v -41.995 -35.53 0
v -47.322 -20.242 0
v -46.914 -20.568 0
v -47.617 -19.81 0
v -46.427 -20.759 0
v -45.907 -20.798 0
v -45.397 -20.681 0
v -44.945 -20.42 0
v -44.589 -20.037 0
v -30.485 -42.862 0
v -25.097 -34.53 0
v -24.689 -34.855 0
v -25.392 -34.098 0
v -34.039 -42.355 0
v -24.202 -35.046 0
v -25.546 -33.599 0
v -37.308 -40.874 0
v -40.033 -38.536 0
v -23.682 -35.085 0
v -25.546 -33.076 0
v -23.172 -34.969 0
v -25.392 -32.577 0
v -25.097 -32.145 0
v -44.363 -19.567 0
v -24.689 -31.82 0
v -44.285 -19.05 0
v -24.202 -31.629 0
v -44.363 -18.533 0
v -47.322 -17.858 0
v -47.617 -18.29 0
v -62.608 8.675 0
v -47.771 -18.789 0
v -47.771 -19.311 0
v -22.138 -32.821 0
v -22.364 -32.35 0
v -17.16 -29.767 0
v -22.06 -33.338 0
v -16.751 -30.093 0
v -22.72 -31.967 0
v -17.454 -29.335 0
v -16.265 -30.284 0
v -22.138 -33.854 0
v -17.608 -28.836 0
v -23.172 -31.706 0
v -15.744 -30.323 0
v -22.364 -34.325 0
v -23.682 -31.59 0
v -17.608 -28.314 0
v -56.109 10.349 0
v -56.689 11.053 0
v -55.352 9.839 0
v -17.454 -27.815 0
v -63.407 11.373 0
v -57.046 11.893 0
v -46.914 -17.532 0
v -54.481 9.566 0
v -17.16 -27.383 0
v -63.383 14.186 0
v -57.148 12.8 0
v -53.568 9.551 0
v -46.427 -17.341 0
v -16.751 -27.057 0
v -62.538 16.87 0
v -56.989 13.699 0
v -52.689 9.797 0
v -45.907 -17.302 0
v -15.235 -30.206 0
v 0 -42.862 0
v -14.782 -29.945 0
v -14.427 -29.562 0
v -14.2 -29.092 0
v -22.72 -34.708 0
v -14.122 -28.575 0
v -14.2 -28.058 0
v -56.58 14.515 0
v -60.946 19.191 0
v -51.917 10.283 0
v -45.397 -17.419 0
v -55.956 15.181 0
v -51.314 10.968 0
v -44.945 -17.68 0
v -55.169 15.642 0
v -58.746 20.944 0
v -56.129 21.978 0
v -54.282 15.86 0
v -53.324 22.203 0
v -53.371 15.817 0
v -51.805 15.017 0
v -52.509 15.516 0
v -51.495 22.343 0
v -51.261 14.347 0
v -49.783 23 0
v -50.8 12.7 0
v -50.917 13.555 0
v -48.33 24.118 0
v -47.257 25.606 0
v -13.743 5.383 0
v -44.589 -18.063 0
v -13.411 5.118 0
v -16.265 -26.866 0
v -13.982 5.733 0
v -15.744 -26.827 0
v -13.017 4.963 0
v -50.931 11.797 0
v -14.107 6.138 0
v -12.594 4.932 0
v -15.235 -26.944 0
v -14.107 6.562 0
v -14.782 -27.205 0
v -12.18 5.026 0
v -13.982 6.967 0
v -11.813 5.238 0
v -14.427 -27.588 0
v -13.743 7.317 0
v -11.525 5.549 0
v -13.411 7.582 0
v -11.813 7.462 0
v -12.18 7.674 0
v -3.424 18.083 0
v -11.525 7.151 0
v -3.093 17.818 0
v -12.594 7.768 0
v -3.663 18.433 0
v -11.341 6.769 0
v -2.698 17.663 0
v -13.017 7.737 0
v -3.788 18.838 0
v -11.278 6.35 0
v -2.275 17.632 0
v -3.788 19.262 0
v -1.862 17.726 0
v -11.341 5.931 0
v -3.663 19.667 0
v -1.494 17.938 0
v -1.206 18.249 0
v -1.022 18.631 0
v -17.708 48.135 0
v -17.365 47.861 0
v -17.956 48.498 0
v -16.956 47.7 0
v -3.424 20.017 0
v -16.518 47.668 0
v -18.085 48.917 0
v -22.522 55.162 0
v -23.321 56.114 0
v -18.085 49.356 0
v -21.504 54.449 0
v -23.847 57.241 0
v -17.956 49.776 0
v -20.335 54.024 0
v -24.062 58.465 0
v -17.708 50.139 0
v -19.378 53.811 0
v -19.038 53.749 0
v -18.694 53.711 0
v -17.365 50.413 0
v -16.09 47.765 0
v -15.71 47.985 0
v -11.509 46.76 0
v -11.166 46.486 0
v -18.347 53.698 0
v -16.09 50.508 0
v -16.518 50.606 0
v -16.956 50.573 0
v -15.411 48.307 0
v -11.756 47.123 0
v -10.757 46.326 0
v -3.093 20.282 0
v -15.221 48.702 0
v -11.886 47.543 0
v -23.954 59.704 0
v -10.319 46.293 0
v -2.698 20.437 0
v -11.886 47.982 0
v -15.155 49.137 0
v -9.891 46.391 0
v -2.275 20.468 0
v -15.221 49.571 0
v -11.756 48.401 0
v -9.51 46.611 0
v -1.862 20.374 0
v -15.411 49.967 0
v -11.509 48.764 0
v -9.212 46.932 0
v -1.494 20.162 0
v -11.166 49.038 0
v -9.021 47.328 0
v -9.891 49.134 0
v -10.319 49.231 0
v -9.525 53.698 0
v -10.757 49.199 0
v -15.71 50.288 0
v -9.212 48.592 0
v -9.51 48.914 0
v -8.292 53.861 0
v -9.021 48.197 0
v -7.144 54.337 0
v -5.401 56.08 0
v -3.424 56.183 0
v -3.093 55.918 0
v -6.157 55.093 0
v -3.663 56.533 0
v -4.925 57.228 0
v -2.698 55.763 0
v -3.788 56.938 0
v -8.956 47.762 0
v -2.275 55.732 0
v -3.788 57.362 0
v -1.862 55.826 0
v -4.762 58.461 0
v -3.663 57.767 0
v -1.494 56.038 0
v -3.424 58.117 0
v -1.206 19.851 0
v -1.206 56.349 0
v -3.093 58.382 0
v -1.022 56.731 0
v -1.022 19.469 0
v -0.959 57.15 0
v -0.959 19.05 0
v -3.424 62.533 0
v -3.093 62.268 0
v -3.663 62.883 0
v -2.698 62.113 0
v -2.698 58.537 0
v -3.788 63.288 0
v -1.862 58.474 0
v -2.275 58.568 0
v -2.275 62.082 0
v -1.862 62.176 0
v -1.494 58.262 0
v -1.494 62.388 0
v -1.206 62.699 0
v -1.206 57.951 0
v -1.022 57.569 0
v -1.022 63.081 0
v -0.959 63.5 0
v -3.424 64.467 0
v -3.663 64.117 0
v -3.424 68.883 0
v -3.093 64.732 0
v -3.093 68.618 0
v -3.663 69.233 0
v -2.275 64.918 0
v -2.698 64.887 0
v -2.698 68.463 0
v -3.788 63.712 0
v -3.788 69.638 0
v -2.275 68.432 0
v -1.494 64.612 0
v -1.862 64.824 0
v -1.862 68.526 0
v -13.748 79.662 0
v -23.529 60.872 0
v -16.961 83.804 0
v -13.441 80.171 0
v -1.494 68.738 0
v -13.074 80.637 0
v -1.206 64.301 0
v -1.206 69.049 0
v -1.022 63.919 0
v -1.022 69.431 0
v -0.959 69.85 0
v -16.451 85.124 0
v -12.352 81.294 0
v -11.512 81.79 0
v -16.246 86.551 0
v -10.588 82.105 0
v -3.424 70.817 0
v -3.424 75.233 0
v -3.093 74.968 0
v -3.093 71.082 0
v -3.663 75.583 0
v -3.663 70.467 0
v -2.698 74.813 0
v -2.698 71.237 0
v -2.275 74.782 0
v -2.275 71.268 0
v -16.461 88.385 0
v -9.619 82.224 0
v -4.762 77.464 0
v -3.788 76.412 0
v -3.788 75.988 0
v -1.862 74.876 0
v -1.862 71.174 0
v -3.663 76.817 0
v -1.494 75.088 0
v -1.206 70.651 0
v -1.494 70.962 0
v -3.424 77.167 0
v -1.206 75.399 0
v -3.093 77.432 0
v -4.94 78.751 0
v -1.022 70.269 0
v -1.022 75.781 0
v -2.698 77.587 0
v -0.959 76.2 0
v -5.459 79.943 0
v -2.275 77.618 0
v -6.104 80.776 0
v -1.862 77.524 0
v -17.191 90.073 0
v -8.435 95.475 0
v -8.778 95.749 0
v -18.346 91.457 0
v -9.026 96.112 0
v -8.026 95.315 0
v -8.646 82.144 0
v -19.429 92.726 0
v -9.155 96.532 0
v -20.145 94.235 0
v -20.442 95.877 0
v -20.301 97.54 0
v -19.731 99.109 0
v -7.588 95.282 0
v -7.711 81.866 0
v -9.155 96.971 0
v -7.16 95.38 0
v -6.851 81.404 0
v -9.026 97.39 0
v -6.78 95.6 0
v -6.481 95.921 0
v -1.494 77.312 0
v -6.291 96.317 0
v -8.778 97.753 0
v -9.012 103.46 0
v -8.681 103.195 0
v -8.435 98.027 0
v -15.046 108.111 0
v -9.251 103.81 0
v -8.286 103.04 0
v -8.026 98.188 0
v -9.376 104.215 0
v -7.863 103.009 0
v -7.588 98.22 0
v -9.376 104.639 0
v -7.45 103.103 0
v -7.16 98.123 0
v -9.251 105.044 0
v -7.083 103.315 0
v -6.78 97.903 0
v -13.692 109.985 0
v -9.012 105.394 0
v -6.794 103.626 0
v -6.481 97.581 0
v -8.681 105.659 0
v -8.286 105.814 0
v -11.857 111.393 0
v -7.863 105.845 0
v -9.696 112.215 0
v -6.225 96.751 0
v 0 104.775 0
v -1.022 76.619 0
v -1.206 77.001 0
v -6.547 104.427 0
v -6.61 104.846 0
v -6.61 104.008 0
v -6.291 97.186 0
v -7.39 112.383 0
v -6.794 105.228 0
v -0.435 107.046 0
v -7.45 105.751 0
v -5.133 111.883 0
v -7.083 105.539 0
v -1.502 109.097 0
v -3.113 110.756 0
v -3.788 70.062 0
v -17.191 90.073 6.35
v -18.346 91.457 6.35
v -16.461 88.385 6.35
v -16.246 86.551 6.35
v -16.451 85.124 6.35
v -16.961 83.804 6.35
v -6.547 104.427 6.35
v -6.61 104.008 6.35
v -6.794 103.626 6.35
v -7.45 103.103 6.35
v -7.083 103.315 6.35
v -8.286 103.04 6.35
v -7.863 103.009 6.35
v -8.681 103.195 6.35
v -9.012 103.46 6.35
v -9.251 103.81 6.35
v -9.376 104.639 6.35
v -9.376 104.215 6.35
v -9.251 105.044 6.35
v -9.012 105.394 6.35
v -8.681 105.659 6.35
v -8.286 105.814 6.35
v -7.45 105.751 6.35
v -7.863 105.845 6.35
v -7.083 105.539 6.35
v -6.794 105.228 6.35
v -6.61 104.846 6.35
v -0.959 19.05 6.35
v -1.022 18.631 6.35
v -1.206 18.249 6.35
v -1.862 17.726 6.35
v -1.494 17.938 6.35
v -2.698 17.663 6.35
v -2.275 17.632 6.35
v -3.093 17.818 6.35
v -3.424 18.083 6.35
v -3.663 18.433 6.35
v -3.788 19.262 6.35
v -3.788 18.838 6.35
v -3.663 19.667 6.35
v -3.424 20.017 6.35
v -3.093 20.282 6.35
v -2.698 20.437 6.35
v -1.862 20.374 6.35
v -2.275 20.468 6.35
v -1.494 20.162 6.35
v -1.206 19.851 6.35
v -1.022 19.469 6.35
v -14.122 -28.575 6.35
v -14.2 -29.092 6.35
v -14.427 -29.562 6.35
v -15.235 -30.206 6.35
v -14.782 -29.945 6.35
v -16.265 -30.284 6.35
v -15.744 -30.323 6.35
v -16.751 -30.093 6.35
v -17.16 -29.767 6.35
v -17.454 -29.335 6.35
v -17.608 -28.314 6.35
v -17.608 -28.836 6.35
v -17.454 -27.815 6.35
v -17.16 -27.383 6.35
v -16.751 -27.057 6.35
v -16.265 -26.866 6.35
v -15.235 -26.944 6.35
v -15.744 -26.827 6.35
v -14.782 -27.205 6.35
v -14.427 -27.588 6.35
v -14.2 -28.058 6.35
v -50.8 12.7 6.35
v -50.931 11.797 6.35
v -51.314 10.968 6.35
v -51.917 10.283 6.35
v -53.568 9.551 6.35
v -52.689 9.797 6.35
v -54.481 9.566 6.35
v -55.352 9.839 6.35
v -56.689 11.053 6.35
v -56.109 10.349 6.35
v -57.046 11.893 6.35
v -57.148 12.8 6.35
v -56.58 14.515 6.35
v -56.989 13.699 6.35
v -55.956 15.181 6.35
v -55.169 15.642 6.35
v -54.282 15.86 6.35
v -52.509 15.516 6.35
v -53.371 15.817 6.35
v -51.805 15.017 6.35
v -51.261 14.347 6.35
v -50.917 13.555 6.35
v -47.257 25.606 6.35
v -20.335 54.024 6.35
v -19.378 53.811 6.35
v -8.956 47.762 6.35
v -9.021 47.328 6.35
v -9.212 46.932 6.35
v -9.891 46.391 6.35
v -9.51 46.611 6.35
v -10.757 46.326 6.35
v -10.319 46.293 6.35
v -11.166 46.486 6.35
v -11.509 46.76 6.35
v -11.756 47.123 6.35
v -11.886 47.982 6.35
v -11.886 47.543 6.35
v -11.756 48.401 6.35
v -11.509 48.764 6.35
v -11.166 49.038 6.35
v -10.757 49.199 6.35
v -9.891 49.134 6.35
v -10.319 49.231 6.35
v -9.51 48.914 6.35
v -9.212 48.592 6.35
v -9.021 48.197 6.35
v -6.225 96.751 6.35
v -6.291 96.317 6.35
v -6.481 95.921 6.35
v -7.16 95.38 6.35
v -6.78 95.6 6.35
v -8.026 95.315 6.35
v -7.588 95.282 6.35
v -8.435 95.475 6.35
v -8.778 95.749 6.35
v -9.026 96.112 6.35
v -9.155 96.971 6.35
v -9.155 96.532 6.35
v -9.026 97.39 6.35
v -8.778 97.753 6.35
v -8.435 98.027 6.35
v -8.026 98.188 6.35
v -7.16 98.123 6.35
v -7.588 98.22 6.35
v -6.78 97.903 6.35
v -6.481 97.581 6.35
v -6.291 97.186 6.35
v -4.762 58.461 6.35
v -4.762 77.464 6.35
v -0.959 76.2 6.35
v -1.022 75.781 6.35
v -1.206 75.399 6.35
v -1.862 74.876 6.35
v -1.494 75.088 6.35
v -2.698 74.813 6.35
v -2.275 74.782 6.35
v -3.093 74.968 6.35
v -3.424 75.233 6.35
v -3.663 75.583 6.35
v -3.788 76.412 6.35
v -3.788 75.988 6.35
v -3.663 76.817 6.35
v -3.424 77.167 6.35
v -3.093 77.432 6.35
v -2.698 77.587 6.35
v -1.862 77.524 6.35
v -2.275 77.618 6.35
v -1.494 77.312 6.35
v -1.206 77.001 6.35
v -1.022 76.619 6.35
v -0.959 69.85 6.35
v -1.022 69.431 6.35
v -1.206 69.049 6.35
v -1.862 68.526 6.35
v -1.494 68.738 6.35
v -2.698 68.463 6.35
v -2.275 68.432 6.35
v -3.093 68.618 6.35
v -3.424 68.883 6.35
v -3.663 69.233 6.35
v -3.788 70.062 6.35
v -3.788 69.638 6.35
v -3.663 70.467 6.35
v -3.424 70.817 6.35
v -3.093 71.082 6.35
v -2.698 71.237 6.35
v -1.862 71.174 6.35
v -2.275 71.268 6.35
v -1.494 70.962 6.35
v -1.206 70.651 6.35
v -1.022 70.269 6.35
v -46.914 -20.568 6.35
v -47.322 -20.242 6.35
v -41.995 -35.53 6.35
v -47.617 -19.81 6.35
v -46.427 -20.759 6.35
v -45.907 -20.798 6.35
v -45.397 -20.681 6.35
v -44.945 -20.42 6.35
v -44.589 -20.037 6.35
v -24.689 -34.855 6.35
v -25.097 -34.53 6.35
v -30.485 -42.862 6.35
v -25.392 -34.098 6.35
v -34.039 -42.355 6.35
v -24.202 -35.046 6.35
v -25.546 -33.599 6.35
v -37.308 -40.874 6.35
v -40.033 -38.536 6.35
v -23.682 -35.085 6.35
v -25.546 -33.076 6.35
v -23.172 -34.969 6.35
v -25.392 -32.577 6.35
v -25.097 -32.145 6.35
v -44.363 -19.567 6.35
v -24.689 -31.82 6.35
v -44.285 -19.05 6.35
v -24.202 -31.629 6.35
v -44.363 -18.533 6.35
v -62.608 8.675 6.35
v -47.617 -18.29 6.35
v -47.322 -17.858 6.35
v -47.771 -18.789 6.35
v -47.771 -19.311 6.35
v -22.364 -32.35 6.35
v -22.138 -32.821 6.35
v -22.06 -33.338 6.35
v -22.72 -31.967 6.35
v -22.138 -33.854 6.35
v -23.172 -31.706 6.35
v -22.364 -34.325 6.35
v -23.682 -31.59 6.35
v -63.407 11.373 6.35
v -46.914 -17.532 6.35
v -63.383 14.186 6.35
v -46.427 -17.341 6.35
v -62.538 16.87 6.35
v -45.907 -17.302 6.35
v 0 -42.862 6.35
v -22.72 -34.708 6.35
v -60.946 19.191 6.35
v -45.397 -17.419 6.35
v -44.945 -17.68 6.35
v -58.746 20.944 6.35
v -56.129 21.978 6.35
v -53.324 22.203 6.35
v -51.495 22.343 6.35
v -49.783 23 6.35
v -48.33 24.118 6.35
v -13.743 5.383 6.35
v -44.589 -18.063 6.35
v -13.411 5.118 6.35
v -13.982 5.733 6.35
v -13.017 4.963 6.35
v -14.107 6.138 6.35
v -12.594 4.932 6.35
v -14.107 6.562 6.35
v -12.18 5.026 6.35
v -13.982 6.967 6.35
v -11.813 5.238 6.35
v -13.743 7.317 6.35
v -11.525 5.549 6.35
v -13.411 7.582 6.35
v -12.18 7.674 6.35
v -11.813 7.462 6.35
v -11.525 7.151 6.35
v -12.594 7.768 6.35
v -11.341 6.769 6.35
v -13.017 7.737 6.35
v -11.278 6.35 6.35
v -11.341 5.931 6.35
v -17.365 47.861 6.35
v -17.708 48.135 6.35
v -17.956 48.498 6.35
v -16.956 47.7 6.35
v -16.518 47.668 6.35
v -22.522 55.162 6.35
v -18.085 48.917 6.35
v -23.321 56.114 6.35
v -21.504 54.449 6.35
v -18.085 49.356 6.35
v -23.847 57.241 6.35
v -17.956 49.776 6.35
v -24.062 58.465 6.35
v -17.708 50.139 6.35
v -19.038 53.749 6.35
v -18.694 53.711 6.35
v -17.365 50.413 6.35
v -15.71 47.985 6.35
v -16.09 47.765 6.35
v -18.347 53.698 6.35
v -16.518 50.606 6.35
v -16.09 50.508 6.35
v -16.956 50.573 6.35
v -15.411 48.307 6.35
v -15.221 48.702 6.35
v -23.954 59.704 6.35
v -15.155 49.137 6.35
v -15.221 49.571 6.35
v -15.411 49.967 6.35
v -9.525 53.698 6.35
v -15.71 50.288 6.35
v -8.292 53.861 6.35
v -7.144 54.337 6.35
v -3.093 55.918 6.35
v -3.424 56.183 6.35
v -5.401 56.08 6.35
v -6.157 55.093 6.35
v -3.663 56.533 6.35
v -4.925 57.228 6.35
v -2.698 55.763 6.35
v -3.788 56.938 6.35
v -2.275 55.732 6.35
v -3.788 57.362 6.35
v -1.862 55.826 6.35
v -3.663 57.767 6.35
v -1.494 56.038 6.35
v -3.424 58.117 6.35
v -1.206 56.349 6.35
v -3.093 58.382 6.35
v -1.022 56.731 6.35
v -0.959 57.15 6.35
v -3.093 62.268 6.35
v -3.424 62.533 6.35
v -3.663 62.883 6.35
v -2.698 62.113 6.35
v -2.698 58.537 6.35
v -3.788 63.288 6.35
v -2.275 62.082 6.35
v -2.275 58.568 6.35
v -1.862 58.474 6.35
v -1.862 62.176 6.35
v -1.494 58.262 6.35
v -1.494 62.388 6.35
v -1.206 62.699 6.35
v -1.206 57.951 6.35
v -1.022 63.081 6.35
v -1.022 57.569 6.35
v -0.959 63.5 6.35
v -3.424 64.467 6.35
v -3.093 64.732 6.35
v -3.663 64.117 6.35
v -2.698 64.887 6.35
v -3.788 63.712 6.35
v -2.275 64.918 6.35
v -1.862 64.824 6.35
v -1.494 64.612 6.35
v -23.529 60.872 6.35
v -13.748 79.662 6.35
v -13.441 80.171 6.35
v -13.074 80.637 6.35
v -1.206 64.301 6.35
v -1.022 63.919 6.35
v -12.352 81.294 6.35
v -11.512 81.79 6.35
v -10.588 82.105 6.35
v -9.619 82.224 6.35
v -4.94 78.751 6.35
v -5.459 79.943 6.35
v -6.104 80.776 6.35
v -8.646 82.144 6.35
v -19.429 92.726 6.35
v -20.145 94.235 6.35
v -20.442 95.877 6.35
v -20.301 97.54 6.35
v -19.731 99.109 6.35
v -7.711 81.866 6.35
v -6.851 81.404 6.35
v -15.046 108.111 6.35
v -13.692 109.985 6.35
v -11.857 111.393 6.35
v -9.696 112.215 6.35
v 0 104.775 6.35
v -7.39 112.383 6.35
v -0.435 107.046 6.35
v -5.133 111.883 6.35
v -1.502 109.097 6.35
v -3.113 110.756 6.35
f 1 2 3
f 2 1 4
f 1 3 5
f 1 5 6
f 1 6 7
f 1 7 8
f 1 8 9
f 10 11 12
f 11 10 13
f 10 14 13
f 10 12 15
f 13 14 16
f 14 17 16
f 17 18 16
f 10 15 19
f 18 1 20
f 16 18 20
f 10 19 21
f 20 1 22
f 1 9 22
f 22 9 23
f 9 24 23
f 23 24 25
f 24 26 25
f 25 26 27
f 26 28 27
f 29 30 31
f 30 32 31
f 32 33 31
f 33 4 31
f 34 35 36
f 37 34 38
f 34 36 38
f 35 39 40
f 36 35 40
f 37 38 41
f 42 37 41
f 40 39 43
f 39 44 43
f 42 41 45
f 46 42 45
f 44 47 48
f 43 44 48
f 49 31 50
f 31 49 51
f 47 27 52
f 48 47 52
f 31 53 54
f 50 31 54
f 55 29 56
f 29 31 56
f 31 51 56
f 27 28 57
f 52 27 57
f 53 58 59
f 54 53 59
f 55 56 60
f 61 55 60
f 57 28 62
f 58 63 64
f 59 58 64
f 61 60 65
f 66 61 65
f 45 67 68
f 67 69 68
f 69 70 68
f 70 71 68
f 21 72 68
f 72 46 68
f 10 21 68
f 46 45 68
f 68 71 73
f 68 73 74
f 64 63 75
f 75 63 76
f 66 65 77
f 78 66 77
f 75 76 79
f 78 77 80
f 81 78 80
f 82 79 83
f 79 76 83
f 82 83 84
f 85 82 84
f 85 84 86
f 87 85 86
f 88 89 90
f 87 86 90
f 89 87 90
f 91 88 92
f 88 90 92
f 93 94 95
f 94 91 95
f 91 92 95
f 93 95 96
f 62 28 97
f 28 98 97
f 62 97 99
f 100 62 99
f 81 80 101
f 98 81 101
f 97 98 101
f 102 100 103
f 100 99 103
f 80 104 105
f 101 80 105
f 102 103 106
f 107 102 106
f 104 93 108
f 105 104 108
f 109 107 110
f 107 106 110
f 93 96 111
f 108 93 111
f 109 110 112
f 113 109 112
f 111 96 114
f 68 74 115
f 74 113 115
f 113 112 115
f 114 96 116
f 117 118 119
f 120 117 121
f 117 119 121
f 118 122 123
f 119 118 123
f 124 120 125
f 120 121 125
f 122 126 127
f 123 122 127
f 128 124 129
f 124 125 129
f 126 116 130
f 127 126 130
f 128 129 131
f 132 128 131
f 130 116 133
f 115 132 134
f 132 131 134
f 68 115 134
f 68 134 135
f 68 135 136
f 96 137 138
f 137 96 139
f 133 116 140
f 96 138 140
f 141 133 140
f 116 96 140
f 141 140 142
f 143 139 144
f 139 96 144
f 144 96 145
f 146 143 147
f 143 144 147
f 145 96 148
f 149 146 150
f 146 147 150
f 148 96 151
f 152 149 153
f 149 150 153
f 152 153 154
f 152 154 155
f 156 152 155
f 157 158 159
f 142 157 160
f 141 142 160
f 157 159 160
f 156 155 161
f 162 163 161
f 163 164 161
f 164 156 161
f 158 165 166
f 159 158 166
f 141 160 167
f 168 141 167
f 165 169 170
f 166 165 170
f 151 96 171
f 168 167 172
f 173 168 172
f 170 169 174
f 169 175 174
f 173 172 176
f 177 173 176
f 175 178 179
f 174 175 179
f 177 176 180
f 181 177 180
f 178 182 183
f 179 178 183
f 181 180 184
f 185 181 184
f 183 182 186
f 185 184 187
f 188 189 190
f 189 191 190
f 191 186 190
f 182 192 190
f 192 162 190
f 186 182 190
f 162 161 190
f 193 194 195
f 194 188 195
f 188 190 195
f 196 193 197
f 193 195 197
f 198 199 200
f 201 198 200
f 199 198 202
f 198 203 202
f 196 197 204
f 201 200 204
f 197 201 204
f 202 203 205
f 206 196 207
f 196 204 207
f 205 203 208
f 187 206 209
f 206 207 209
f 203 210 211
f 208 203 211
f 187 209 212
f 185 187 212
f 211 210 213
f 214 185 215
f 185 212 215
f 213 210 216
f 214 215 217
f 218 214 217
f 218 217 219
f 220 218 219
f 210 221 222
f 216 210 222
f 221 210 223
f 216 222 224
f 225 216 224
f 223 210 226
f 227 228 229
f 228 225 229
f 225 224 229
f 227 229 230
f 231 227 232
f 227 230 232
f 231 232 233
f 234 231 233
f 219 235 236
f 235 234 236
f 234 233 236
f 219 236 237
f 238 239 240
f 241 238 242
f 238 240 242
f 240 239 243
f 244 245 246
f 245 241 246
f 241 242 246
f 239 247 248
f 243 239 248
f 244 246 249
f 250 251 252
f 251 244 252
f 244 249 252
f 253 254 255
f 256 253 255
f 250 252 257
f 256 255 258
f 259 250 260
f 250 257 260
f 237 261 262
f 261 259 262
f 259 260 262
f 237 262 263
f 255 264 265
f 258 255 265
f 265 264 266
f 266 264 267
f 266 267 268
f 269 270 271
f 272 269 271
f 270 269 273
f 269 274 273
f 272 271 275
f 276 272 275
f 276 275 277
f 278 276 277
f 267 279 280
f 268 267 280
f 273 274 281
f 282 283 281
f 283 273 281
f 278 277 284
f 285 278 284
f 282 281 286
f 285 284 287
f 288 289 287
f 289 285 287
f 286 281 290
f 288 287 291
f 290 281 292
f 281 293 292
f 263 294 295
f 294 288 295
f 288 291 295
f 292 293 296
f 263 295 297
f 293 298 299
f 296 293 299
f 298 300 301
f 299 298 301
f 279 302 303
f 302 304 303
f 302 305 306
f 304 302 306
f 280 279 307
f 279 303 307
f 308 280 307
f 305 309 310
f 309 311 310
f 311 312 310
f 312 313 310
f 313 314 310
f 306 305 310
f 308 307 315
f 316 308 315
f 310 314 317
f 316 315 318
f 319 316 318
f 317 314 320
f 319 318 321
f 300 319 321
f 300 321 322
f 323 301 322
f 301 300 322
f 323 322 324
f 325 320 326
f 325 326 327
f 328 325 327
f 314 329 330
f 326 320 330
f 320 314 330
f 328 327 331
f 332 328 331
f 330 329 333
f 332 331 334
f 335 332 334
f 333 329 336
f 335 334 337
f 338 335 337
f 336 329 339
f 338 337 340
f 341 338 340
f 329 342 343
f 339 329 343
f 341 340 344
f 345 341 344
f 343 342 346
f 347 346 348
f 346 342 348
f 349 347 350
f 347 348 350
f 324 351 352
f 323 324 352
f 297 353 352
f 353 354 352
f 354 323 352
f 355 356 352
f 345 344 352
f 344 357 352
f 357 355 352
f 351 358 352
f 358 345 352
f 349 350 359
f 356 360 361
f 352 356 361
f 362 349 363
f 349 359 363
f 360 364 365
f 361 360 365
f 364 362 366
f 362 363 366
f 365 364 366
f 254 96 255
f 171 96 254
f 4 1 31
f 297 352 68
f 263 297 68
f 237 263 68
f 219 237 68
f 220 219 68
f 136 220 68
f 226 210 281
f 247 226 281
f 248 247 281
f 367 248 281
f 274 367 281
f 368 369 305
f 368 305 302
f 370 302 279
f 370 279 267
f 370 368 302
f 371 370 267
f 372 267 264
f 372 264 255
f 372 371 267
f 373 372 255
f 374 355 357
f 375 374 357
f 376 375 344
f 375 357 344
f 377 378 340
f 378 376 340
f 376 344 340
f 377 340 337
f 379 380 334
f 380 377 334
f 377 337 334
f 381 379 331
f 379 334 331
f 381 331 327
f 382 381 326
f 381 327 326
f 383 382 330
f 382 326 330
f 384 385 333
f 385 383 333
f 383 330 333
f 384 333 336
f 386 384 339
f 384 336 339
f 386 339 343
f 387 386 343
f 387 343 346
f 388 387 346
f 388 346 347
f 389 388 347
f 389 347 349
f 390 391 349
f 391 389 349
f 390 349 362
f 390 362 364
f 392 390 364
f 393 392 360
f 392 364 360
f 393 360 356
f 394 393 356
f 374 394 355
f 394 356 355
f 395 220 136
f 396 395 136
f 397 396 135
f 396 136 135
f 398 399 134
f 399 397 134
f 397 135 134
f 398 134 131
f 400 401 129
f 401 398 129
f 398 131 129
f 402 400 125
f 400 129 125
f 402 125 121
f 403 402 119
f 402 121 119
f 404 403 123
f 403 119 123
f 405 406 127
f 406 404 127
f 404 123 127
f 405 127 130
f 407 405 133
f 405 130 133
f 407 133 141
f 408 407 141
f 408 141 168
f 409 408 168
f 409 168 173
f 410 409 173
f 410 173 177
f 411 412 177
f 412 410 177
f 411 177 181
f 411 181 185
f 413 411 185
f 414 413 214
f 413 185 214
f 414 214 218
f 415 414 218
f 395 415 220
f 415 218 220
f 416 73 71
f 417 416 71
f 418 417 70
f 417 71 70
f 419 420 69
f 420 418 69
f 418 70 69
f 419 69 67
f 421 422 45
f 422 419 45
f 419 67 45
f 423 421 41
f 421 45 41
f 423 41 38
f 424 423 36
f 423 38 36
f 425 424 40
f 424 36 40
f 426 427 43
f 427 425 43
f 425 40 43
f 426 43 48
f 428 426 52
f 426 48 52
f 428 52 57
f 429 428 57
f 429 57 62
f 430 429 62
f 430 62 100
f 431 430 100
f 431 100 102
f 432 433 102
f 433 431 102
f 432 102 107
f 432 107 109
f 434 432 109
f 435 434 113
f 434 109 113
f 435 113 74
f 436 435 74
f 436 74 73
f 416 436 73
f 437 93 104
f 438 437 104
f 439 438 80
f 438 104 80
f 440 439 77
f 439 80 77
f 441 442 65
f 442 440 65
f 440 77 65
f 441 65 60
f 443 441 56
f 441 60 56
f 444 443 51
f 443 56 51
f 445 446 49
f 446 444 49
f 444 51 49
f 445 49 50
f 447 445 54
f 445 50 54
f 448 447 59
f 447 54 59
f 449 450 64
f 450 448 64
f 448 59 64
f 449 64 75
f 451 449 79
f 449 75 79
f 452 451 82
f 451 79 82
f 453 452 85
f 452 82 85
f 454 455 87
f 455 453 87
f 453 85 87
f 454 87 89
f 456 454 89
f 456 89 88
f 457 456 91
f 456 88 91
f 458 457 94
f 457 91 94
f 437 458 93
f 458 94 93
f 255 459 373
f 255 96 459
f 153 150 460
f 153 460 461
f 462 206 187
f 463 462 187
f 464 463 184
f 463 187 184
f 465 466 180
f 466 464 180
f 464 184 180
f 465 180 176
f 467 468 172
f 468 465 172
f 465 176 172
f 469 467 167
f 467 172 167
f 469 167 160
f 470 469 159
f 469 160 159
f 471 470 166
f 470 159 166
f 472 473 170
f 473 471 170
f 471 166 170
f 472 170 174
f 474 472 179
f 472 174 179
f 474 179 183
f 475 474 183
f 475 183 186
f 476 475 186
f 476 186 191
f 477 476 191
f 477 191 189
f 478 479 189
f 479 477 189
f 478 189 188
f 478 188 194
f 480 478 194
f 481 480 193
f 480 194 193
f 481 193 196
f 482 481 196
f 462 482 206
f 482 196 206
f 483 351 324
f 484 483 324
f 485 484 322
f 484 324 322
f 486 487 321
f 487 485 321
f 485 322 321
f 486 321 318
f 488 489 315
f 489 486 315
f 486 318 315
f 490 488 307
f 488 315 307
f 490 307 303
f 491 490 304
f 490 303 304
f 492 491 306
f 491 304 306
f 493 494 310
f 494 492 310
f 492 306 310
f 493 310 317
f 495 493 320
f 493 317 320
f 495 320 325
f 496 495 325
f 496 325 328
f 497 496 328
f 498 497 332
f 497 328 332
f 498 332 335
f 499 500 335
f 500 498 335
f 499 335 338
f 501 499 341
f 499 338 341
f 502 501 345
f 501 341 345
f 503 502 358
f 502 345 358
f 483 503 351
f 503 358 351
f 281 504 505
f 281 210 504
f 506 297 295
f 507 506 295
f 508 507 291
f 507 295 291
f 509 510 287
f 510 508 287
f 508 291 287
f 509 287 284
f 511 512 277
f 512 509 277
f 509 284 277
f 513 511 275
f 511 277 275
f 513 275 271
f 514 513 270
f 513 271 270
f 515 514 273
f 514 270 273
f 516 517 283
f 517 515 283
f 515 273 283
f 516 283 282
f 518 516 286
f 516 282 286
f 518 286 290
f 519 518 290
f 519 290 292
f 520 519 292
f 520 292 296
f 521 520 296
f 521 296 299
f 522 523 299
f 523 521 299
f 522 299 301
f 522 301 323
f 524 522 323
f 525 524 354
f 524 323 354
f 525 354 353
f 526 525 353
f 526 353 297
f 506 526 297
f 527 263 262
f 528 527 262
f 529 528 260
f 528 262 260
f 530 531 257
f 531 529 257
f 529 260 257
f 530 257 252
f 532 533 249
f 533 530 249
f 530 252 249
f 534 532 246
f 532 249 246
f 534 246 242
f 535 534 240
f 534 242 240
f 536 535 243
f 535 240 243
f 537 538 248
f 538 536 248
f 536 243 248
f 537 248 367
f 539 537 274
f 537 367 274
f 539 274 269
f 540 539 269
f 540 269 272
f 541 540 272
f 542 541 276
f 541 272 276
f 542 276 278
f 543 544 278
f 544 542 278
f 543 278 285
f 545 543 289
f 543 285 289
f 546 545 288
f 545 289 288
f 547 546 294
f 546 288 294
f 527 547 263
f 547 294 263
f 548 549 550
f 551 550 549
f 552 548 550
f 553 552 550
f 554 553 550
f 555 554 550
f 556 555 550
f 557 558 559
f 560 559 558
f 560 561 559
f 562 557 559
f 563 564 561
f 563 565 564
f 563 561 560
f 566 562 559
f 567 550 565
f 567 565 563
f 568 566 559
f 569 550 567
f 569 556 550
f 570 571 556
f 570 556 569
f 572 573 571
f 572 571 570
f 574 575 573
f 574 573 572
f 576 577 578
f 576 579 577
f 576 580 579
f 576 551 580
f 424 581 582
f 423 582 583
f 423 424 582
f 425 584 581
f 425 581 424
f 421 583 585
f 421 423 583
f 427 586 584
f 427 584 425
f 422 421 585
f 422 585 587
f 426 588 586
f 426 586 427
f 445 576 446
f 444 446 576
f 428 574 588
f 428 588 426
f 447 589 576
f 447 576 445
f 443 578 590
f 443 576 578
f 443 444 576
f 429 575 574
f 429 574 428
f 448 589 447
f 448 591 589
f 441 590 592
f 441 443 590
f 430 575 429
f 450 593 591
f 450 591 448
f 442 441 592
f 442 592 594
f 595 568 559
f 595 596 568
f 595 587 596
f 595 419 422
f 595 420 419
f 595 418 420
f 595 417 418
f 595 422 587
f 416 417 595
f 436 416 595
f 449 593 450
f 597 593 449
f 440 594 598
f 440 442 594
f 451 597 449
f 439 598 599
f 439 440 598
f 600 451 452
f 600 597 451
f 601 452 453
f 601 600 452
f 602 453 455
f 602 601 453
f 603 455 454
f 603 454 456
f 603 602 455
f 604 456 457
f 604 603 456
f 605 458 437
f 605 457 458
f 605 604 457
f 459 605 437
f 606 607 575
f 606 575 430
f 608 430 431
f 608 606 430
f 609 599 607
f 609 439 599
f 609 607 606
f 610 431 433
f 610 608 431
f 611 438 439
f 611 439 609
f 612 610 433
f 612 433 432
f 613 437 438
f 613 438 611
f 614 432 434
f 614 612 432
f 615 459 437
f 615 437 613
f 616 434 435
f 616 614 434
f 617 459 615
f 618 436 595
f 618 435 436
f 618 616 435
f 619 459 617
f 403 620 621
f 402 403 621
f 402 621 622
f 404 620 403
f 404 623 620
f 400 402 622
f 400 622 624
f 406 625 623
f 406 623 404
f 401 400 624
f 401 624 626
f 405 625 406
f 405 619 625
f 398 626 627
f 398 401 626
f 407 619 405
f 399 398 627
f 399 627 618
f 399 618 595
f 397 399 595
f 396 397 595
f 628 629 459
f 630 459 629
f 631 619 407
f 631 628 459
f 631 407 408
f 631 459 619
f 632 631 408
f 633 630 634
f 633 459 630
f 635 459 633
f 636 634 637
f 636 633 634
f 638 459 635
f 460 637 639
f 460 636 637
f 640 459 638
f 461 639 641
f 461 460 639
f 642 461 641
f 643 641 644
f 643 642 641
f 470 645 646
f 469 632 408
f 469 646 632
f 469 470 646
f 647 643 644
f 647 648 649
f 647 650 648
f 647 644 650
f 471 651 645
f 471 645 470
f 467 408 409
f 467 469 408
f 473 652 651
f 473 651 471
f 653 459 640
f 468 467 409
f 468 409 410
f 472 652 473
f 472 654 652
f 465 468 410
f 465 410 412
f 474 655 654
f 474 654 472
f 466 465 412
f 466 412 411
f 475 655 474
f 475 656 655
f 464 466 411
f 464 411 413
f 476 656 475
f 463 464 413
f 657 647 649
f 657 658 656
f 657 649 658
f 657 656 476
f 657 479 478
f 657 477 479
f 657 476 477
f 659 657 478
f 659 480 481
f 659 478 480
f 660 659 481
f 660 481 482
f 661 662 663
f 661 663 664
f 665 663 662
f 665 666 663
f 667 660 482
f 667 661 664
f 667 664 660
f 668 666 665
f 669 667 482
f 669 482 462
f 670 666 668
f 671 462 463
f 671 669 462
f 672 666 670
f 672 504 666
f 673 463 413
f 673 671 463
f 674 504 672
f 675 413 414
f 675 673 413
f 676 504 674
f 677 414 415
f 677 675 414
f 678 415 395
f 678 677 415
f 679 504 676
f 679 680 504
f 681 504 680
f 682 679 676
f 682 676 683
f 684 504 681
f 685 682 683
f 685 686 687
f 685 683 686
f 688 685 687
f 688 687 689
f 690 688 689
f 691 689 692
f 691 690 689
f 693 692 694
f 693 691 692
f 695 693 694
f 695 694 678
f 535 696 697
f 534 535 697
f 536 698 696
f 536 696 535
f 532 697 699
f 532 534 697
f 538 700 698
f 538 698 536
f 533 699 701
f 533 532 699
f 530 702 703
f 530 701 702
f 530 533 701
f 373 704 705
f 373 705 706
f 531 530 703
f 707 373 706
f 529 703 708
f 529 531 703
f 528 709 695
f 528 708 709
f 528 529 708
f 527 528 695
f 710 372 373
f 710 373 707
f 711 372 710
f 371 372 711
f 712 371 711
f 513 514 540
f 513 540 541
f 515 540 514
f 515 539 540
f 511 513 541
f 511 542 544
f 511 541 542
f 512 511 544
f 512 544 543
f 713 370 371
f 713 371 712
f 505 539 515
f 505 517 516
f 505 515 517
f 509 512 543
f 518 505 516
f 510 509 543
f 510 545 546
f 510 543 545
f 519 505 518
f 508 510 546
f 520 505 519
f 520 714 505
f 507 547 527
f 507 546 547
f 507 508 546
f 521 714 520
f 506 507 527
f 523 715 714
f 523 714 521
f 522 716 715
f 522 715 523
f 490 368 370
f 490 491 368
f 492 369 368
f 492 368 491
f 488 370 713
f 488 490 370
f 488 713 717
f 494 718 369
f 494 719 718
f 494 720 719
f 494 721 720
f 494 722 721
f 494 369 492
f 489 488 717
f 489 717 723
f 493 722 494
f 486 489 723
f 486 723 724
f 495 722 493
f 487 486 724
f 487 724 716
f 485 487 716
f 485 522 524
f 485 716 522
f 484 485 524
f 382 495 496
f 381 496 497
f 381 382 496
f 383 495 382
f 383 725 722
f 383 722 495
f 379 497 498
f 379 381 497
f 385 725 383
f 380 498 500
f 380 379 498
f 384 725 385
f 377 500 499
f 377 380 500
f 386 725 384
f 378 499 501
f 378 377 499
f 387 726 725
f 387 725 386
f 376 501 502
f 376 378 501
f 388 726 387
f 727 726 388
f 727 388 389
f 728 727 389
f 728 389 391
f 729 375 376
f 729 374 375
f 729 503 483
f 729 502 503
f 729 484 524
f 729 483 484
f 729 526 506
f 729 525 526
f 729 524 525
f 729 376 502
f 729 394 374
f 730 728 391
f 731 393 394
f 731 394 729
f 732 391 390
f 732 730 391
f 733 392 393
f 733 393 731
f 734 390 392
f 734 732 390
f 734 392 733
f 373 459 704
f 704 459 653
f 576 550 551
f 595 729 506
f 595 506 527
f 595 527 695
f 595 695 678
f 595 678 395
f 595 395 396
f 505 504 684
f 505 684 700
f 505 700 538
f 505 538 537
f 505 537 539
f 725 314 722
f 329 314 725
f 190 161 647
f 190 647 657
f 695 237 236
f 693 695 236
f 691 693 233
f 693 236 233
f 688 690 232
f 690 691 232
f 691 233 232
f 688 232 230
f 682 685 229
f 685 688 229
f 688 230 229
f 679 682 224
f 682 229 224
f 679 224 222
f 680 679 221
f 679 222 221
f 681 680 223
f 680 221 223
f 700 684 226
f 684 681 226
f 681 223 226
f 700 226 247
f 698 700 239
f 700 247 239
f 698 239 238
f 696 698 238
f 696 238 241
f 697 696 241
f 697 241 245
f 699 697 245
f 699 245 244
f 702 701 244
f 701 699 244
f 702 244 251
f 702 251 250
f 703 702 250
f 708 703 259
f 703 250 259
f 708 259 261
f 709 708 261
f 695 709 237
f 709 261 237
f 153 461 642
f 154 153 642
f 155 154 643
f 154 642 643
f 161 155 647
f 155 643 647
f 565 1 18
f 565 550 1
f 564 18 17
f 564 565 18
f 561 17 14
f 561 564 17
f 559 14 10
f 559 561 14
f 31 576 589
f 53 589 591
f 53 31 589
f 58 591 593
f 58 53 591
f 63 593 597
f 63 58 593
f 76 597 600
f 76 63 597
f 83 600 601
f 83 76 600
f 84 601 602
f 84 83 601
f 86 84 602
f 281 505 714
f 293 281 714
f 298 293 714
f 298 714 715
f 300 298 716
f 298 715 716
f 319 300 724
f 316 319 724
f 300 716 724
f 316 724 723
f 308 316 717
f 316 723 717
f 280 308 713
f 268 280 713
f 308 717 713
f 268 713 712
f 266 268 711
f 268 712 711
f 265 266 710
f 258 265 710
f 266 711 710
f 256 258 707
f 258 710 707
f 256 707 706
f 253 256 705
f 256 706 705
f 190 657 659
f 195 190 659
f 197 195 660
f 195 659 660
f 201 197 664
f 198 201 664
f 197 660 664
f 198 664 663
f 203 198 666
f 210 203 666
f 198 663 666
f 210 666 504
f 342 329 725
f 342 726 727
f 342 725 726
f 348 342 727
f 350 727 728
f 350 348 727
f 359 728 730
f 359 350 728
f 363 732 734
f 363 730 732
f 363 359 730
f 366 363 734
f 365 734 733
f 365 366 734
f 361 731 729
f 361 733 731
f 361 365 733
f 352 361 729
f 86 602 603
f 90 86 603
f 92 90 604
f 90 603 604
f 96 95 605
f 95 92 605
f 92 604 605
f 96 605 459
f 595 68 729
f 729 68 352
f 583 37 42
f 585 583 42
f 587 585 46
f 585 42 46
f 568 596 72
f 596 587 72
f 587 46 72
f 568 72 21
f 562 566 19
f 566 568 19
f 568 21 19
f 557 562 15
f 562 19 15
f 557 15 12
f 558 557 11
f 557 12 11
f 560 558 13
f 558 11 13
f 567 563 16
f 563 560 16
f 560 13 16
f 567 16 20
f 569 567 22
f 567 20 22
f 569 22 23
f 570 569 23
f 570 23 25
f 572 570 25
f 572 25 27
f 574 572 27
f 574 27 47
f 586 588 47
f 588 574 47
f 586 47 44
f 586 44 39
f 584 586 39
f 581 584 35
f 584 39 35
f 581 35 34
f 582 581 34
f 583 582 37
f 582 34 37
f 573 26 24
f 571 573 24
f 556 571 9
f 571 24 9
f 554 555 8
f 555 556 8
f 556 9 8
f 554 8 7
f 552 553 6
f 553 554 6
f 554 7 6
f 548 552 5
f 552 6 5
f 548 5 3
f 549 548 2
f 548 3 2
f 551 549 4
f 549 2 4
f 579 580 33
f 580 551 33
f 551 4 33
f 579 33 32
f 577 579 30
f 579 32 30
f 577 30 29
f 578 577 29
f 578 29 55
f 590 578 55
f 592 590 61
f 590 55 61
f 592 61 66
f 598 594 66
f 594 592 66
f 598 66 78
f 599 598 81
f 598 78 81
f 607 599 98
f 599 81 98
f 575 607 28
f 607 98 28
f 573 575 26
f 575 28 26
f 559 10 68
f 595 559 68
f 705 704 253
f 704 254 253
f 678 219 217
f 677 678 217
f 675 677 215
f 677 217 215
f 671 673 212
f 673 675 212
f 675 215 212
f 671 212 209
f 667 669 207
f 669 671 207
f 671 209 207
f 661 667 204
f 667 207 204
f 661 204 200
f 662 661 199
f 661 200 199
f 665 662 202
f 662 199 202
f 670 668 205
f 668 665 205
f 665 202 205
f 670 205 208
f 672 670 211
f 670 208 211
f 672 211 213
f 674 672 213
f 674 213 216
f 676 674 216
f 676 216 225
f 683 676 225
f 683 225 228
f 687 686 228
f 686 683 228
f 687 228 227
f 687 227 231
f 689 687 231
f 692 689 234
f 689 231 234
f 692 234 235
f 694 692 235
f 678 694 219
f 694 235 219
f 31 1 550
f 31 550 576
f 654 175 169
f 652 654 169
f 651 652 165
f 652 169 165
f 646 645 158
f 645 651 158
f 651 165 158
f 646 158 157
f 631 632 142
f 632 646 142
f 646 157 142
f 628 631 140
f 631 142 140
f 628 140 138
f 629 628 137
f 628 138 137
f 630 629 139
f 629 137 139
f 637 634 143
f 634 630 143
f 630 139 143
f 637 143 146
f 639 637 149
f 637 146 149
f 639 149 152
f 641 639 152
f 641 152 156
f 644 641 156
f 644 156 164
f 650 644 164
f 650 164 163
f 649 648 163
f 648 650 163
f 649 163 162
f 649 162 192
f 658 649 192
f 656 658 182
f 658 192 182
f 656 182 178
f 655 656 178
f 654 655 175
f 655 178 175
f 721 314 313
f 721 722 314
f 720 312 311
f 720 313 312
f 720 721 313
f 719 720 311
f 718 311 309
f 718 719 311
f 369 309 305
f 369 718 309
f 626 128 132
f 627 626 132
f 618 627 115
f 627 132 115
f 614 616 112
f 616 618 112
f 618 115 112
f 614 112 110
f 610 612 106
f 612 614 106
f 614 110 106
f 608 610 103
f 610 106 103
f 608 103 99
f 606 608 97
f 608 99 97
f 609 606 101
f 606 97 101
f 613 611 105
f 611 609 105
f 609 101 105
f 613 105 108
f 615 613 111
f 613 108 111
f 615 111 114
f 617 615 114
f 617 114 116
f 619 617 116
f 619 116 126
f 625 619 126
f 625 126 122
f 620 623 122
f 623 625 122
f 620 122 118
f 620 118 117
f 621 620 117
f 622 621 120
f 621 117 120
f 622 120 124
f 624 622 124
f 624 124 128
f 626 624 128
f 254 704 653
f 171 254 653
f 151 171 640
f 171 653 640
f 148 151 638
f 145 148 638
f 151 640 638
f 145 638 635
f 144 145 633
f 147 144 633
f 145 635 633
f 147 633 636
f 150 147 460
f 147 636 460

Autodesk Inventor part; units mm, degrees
ref_plane "YZ Plane" through (0, 0, 0) normal (1, 0, 0) x (0, 1, 0)
ref_plane "XZ Plane" through (0, 0, 0) normal (0, 1, 0) x (-1, 0, 0)
ref_plane "XY Plane" through (0, 0, 0) normal (0, 0, 1) x (1, 0, 0)
sketch "Sketch1" plane through (0, 0, 0) normal (0, 0, 1) x (1, 0, 0)
  line L0 (0, 0) -> (0, 137.0131)
  line L1 (-11.7886, 12.2907) -> (-39.6863, 18.4755) construction
  line L2 (-39.6863, 18.4755) -> (-33.3297, 47.1481) construction
  line L3 (-33.3297, 47.1481) -> (-5.432, 40.9633) construction
  line L4 (-5.432, 40.9633) -> (-11.7886, 12.2907) construction
  line L5 (-39.6863, 18.4755) -> (-5.432, 40.9633) construction
  line L6 (-33.3297, 47.1481) -> (-11.7886, 12.2907) construction
  circle A0 centre (-53.975, 12.7) radius 3.175
  circle A1 centre (-53.975, 12.7) radius 9.525
  line L7 (0, 0) -> (-54.5315, 3.1913) construction
  line L8 (-62.4238, 17.0982) -> (0, 137.0131)
  line L9 (-27.1302, 45.7737) -> (-37.4529, 28.5497) construction
  line L10 (-11.6315, 42.3377) -> (-9.5552, 22.3649) construction
  line L11 (-19.3809, 44.0557) -> (-25.7374, 15.3831) construction
  line L12 (0, 104.775) -> (-15.0457, 108.1106)
  line L13 (-35.3766, 8.5768) -> (-19.8779, 5.1408) construction
  line L14 (-19.8779, 5.1408) -> (-21.2523, -1.0586) construction
  line L15 (-21.2523, -1.0586) -> (-36.751, 2.3773) construction
  line L16 (-36.751, 2.3773) -> (-35.3766, 8.5768) construction
  line L17 (-35.3766, 8.5768) -> (-44.7305, 2.6177) construction
  line L18 (-19.8779, 5.1408) -> (-17.2457, 1.0092) construction
  line L19 (-5.432, 40.9633) -> (-33.3297, 47.1481) construction
  line L20 (-33.3297, 47.1481) -> (-32.2475, 52.0296) construction
  line L21 (-32.2475, 52.0296) -> (-4.3498, 45.8448) construction
  line L22 (-4.3498, 45.8448) -> (-5.432, 40.9633) construction
  line L23 (-53.2878, 15.7997) -> (-53.975, 12.7) construction
  line L24 (-53.975, 12.7) -> (-57.0747, 13.3872) construction
  line L25 (-27.6272, 6.8588) -> (-34.4992, -24.1386) construction
  line L26 (-31.8676, 50.076) -> (-5.5198, 44.2349) construction
  line L27 (-5.5198, 44.2349) -> (-4.489, 48.8845) construction
  line L28 (-4.489, 48.8845) -> (-30.8368, 54.7256) construction
  line L29 (-30.8368, 54.7256) -> (-31.8676, 50.076) construction
  line L30 (-31.3522, 52.4008) -> (-5.0044, 46.5597) construction
  circle A2 centre (-29.0274, 51.8854) radius 1.4732 construction
  circle A3 centre (-22.8279, 50.5111) radius 1.4732 construction
  circle A4 centre (-16.6284, 49.1367) radius 1.4732
  circle A5 centre (-10.4289, 47.7623) radius 1.4732
  circle A6 centre (-7.6985, 96.7513) radius 1.4732
  line L31 (-53.975, 12.7) -> (-5.4185, 105.9762)
  line L32 (-31.2085, 56.4341) -> (0, 49.5153)
  circle A7 centre (-7.6985, 96.7513) radius 4.7625
  line L33 (-4.7625, 50.5712) -> (-4.7625, 105.8308)
  line L34 (-26.3948, 55.3669) -> (-7.323, 92.0036)
  line L35 (-3.5958, 94.3328) -> (-4.7625, 94.5914) construction
  line L36 (-17.2457, 1.0092) -> (0, 1.0092) construction
  line L37 (0, 1.0092) -> (0, -2.1658) construction
  line L38 (0, -2.1658) -> (-17.2457, -2.1658) construction
  line L39 (-17.2457, -2.1658) -> (-17.2457, 1.0092) construction
  circle A8 centre (-12.7, 7.9375) radius 1.5875 construction
  line L40 (-12.7, 7.9375) -> (0, 7.9375) construction
  line L41 (0, 7.9375) -> (-17.2457, 1.0092)
  circle A9 centre (-12.7, 7.9375) radius 3.175 construction
  line L42 (-9.525, 7.9375) -> (-9.525, 4.111) construction
  line L43 (-9.525, 7.9375) -> (0, 7.9375) construction
  line L44 (-17.9187, 46.9837) -> (-16.8879, 51.6333) construction
  line L45 (-12.4942, 45.7811) -> (-26.2381, -16.2137) construction
  line L46 (0, 53.6985) -> (0, 7.9375) construction
  line L47 (-26.2381, -16.2137) -> (-20.0386, -17.5881) construction
  line L48 (-20.0386, -17.5881) -> (-8.7313, 7.9375)
  circle A10 centre (-12.7, 6.35) radius 1.4224
  line L49 (0, 13.4938) -> (-4.7625, 13.4938) construction
  line L50 (-4.7625, 13.4938) -> (-4.7625, 24.6063) construction
  line L51 (-4.7625, 24.6063) -> (0, 24.6063) construction
  line L52 (0, 24.6063) -> (0, 13.4938) construction
  line L53 (-4.7625, 19.05) -> (0, 19.05) construction
  circle A11 centre (-2.3813, 19.05) radius 1.4224
  line L54 (-20.7405, 8.5842) -> (-9.7454, 58.18) construction
  line L55 (-9.7454, 58.18) -> (-3.5459, 56.8056) construction
  line L56 (-3.5459, 56.8056) -> (-14.5411, 7.2098) construction
  line L57 (-14.5411, 7.2098) -> (-20.7405, 8.5842) construction
  line L58 (-12.7, 6.35) -> (-12.7, 7.9375) construction
  line L59 (-11.5442, 1.5875) -> (-9.525, 1.5875) construction
  line L60 (-9.525, 1.5875) -> (-9.525, 7.9375) construction
  line L61 (-9.525, 7.9375) -> (-11.5442, 7.9375) construction
  line L62 (-11.5442, 7.9375) -> (-11.5442, 1.5875) construction
  line L63 (-9.7454, 58.18) -> (-15.9449, 59.5544) construction
  line L64 (-18.8691, 53.6985) -> (0, 53.6985)
  line L65 (-9.7454, 58.18) -> (-17.3193, 53.3549) construction
  arc A12 (-10.2313, 55.9882) -> (-11.9373, 58.6659) centre (-11.0843, 57.3271) ccw construction
  line L66 (-4.7625, 57.15) -> (0, 57.15) construction
  circle A13 centre (-2.3813, 57.15) radius 1.4224
  circle A14 centre (-2.3813, 63.5) radius 1.4224
  line L67 (0, 7.9375) -> (-38.5755, 7.9375) construction
  line L68 (-38.5755, 7.9375) -> (-38.5755, -42.8625) construction
  line L69 (-38.5755, -42.8625) -> (0, -42.8625)
  line L70 (0, -42.8625) -> (0, 7.9375)
  line L71 (-38.5755, -42.8625) -> (-62.6076, 8.6746)
  line L72 (-60.0032, 20.0747) -> (-18.8691, 53.6985)
  line L73 (-20.0386, -17.5881) -> (-20.0386, -42.8625) construction
  line L74 (-20.2435, 47.4991) -> (-19.2127, 52.1487) construction
  line L75 (-12.7, -42.8625) -> (-12.7, -1.0217)
  circle A15 centre (-23.8125, -33.3375) radius 1.7526
  circle A16 centre (-15.875, -28.575) radius 1.7526
  circle A17 centre (-23.8125, -33.3375) radius 3.175 construction
  circle A18 centre (-2.3813, 69.85) radius 1.4224
  circle A19 centre (-2.3813, 76.2) radius 1.4224
  circle A20 centre (-15.875, -28.575) radius 3.175 construction
  circle A21 centre (-46.0375, -19.05) radius 1.7526
  arc A22 (0, 104.775) -> (-15.0457, 108.1106) centre (-7.9697, 104.427) ccw
  circle A23 centre (-7.9697, 104.427) radius 1.4224
  line L76 (-7.9697, 104.427) -> (-15.0457, 108.1106) construction
  line L77 (-7.9697, 104.427) -> (0, 104.775) construction
  line L78 (-14.2148, 89.0787) -> (-22.6636, 93.4768)
  point P0 (-22.5591, 29.7194)
  point P1 (-20.7484, 1.2142)
  point P2 (-36.3367, 4.2458)
  point P3 (-49.5768, 21.1488)
  point P4 (-11.1125, 7.9375)
  point P5 (-11.4283, 6.9872)
  point P6 (-11.9574, 7.9375)
  point P7 (-13.9717, 6.9872)
  point P8 (-9.525, 6.1457)
  point P9 (-10.6215, 3.6705)
  point P10 (-4.7625, 93.0015)
  point P11 (-4.7625, 53.6985)
  dimension "d74" = 6.35
  dimension "d14" = 29.3687
  dimension "d15" = 28.575
  dimension "d16" = 12.5
  dimension "d17" = 6.35
  dimension "d19" = 53.975
  dimension "d22" = 19.05
  dimension "d23" = 7.9375
  dimension "d24" = 19.05
  dimension "d26" = 102.5
  dimension "d29" = 6.35
  dimension "d31" = 7.9375
  dimension "d34" = 5
  dimension "d35" = 26.9875
  dimension "d38" = 31.75
  dimension "d40" = 26.9875
  dimension "d41" = 4.7625
  dimension "d42" = 2.9464
  dimension "d43" = 2.3813
  dimension "d46" = 6.35
  dimension "d51" = 2.9464
  dimension "d52" = 92.075
  dimension "d53" = 6.35
  dimension "d54" = 9.525
  dimension "d55" = 4.7625
  dimension "d56" = 4.7625
  dimension "d60" = 12.7
  dimension "d61" = 3.175
  dimension "d63" = 3.175
  dimension "d66" = 3.175
  dimension "d67" = 12.7
  dimension "d72" = 8.7312
  dimension "d73" = 7.9375
  dimension "d80" = 12.7
  dimension "d82" = 7.9375
  dimension "d83" = 63.5
  dimension "d85" = 6.35
  dimension "d86" = 104.775
  dimension "d87" = 2.8448
  dimension "d88" = 4.7625
  dimension "d89" = 11.1125
  dimension "d90" = 2.8448
  dimension "d91" = 19.05
  dimension "d92" = 6.35
  dimension "d93" = 50.8
  dimension "d94" = 25.4
  dimension "d95" = 8.7312
  dimension "d96" = 9.525
  dimension "d97" = 6.35
  dimension "d99" = 6.35
  dimension "d101" = 3.175
  dimension "d106" = 2.8448
  dimension "d107" = 57.15
  dimension "d110" = 6.35
  dimension "d136" = 3.175
  dimension "d138" = 42.8625
  dimension "d139" = 12.7
  dimension "d140" = 3.5052
  dimension "d141" = 3.5052
  dimension "d142" = 9.525
  dimension "d143" = 3.175
  dimension "d144" = 11.1125
  dimension "d145" = 6.35
  dimension "d146" = 14.2875
  dimension "d149" = 6.35
extrude "Extrusion1" add sketch "Sketch1" along normal blind 6.35 contours L70 L69 L75 L48 L41 L0 | L41 L48 L75 L69 L71 A1 L31 L72 L32 L0 | L32 L33 L64 L0 | L64 L33 A7 L12 L0 | L32 L64 L33 | L12 A22 | L72 L31 L32 | A1 | L33 A7 L31 L12 | L12 L31 A7 L78 L8 | L33 A7 | A7 L31 L33 | L32 L31 A7 L34 | L31 A7
fillet "Fillet6" radius 12.7 1 edges at (-38.5755, -42.8625, 3.175)
fillet "Fillet7" radius 6.35 3 edges at (-22.6636, 93.4768, 3.175) (-14.2148, 89.0787, 3.175) (-49.5768, 21.1488, 3.175)
fillet "Fillet8" radius 4.7625 5 edges at (-4.7625, 93.0015, 3.175) (-7.323, 92.0036, 3.175) (-26.3948, 55.3669, 3.175) (-18.8691, 53.6985, 3.175) (-4.7625, 53.6985, 3.175)
equation "\"d56\" = d55"
properties part number "Uprights" material "UHMW, White"
